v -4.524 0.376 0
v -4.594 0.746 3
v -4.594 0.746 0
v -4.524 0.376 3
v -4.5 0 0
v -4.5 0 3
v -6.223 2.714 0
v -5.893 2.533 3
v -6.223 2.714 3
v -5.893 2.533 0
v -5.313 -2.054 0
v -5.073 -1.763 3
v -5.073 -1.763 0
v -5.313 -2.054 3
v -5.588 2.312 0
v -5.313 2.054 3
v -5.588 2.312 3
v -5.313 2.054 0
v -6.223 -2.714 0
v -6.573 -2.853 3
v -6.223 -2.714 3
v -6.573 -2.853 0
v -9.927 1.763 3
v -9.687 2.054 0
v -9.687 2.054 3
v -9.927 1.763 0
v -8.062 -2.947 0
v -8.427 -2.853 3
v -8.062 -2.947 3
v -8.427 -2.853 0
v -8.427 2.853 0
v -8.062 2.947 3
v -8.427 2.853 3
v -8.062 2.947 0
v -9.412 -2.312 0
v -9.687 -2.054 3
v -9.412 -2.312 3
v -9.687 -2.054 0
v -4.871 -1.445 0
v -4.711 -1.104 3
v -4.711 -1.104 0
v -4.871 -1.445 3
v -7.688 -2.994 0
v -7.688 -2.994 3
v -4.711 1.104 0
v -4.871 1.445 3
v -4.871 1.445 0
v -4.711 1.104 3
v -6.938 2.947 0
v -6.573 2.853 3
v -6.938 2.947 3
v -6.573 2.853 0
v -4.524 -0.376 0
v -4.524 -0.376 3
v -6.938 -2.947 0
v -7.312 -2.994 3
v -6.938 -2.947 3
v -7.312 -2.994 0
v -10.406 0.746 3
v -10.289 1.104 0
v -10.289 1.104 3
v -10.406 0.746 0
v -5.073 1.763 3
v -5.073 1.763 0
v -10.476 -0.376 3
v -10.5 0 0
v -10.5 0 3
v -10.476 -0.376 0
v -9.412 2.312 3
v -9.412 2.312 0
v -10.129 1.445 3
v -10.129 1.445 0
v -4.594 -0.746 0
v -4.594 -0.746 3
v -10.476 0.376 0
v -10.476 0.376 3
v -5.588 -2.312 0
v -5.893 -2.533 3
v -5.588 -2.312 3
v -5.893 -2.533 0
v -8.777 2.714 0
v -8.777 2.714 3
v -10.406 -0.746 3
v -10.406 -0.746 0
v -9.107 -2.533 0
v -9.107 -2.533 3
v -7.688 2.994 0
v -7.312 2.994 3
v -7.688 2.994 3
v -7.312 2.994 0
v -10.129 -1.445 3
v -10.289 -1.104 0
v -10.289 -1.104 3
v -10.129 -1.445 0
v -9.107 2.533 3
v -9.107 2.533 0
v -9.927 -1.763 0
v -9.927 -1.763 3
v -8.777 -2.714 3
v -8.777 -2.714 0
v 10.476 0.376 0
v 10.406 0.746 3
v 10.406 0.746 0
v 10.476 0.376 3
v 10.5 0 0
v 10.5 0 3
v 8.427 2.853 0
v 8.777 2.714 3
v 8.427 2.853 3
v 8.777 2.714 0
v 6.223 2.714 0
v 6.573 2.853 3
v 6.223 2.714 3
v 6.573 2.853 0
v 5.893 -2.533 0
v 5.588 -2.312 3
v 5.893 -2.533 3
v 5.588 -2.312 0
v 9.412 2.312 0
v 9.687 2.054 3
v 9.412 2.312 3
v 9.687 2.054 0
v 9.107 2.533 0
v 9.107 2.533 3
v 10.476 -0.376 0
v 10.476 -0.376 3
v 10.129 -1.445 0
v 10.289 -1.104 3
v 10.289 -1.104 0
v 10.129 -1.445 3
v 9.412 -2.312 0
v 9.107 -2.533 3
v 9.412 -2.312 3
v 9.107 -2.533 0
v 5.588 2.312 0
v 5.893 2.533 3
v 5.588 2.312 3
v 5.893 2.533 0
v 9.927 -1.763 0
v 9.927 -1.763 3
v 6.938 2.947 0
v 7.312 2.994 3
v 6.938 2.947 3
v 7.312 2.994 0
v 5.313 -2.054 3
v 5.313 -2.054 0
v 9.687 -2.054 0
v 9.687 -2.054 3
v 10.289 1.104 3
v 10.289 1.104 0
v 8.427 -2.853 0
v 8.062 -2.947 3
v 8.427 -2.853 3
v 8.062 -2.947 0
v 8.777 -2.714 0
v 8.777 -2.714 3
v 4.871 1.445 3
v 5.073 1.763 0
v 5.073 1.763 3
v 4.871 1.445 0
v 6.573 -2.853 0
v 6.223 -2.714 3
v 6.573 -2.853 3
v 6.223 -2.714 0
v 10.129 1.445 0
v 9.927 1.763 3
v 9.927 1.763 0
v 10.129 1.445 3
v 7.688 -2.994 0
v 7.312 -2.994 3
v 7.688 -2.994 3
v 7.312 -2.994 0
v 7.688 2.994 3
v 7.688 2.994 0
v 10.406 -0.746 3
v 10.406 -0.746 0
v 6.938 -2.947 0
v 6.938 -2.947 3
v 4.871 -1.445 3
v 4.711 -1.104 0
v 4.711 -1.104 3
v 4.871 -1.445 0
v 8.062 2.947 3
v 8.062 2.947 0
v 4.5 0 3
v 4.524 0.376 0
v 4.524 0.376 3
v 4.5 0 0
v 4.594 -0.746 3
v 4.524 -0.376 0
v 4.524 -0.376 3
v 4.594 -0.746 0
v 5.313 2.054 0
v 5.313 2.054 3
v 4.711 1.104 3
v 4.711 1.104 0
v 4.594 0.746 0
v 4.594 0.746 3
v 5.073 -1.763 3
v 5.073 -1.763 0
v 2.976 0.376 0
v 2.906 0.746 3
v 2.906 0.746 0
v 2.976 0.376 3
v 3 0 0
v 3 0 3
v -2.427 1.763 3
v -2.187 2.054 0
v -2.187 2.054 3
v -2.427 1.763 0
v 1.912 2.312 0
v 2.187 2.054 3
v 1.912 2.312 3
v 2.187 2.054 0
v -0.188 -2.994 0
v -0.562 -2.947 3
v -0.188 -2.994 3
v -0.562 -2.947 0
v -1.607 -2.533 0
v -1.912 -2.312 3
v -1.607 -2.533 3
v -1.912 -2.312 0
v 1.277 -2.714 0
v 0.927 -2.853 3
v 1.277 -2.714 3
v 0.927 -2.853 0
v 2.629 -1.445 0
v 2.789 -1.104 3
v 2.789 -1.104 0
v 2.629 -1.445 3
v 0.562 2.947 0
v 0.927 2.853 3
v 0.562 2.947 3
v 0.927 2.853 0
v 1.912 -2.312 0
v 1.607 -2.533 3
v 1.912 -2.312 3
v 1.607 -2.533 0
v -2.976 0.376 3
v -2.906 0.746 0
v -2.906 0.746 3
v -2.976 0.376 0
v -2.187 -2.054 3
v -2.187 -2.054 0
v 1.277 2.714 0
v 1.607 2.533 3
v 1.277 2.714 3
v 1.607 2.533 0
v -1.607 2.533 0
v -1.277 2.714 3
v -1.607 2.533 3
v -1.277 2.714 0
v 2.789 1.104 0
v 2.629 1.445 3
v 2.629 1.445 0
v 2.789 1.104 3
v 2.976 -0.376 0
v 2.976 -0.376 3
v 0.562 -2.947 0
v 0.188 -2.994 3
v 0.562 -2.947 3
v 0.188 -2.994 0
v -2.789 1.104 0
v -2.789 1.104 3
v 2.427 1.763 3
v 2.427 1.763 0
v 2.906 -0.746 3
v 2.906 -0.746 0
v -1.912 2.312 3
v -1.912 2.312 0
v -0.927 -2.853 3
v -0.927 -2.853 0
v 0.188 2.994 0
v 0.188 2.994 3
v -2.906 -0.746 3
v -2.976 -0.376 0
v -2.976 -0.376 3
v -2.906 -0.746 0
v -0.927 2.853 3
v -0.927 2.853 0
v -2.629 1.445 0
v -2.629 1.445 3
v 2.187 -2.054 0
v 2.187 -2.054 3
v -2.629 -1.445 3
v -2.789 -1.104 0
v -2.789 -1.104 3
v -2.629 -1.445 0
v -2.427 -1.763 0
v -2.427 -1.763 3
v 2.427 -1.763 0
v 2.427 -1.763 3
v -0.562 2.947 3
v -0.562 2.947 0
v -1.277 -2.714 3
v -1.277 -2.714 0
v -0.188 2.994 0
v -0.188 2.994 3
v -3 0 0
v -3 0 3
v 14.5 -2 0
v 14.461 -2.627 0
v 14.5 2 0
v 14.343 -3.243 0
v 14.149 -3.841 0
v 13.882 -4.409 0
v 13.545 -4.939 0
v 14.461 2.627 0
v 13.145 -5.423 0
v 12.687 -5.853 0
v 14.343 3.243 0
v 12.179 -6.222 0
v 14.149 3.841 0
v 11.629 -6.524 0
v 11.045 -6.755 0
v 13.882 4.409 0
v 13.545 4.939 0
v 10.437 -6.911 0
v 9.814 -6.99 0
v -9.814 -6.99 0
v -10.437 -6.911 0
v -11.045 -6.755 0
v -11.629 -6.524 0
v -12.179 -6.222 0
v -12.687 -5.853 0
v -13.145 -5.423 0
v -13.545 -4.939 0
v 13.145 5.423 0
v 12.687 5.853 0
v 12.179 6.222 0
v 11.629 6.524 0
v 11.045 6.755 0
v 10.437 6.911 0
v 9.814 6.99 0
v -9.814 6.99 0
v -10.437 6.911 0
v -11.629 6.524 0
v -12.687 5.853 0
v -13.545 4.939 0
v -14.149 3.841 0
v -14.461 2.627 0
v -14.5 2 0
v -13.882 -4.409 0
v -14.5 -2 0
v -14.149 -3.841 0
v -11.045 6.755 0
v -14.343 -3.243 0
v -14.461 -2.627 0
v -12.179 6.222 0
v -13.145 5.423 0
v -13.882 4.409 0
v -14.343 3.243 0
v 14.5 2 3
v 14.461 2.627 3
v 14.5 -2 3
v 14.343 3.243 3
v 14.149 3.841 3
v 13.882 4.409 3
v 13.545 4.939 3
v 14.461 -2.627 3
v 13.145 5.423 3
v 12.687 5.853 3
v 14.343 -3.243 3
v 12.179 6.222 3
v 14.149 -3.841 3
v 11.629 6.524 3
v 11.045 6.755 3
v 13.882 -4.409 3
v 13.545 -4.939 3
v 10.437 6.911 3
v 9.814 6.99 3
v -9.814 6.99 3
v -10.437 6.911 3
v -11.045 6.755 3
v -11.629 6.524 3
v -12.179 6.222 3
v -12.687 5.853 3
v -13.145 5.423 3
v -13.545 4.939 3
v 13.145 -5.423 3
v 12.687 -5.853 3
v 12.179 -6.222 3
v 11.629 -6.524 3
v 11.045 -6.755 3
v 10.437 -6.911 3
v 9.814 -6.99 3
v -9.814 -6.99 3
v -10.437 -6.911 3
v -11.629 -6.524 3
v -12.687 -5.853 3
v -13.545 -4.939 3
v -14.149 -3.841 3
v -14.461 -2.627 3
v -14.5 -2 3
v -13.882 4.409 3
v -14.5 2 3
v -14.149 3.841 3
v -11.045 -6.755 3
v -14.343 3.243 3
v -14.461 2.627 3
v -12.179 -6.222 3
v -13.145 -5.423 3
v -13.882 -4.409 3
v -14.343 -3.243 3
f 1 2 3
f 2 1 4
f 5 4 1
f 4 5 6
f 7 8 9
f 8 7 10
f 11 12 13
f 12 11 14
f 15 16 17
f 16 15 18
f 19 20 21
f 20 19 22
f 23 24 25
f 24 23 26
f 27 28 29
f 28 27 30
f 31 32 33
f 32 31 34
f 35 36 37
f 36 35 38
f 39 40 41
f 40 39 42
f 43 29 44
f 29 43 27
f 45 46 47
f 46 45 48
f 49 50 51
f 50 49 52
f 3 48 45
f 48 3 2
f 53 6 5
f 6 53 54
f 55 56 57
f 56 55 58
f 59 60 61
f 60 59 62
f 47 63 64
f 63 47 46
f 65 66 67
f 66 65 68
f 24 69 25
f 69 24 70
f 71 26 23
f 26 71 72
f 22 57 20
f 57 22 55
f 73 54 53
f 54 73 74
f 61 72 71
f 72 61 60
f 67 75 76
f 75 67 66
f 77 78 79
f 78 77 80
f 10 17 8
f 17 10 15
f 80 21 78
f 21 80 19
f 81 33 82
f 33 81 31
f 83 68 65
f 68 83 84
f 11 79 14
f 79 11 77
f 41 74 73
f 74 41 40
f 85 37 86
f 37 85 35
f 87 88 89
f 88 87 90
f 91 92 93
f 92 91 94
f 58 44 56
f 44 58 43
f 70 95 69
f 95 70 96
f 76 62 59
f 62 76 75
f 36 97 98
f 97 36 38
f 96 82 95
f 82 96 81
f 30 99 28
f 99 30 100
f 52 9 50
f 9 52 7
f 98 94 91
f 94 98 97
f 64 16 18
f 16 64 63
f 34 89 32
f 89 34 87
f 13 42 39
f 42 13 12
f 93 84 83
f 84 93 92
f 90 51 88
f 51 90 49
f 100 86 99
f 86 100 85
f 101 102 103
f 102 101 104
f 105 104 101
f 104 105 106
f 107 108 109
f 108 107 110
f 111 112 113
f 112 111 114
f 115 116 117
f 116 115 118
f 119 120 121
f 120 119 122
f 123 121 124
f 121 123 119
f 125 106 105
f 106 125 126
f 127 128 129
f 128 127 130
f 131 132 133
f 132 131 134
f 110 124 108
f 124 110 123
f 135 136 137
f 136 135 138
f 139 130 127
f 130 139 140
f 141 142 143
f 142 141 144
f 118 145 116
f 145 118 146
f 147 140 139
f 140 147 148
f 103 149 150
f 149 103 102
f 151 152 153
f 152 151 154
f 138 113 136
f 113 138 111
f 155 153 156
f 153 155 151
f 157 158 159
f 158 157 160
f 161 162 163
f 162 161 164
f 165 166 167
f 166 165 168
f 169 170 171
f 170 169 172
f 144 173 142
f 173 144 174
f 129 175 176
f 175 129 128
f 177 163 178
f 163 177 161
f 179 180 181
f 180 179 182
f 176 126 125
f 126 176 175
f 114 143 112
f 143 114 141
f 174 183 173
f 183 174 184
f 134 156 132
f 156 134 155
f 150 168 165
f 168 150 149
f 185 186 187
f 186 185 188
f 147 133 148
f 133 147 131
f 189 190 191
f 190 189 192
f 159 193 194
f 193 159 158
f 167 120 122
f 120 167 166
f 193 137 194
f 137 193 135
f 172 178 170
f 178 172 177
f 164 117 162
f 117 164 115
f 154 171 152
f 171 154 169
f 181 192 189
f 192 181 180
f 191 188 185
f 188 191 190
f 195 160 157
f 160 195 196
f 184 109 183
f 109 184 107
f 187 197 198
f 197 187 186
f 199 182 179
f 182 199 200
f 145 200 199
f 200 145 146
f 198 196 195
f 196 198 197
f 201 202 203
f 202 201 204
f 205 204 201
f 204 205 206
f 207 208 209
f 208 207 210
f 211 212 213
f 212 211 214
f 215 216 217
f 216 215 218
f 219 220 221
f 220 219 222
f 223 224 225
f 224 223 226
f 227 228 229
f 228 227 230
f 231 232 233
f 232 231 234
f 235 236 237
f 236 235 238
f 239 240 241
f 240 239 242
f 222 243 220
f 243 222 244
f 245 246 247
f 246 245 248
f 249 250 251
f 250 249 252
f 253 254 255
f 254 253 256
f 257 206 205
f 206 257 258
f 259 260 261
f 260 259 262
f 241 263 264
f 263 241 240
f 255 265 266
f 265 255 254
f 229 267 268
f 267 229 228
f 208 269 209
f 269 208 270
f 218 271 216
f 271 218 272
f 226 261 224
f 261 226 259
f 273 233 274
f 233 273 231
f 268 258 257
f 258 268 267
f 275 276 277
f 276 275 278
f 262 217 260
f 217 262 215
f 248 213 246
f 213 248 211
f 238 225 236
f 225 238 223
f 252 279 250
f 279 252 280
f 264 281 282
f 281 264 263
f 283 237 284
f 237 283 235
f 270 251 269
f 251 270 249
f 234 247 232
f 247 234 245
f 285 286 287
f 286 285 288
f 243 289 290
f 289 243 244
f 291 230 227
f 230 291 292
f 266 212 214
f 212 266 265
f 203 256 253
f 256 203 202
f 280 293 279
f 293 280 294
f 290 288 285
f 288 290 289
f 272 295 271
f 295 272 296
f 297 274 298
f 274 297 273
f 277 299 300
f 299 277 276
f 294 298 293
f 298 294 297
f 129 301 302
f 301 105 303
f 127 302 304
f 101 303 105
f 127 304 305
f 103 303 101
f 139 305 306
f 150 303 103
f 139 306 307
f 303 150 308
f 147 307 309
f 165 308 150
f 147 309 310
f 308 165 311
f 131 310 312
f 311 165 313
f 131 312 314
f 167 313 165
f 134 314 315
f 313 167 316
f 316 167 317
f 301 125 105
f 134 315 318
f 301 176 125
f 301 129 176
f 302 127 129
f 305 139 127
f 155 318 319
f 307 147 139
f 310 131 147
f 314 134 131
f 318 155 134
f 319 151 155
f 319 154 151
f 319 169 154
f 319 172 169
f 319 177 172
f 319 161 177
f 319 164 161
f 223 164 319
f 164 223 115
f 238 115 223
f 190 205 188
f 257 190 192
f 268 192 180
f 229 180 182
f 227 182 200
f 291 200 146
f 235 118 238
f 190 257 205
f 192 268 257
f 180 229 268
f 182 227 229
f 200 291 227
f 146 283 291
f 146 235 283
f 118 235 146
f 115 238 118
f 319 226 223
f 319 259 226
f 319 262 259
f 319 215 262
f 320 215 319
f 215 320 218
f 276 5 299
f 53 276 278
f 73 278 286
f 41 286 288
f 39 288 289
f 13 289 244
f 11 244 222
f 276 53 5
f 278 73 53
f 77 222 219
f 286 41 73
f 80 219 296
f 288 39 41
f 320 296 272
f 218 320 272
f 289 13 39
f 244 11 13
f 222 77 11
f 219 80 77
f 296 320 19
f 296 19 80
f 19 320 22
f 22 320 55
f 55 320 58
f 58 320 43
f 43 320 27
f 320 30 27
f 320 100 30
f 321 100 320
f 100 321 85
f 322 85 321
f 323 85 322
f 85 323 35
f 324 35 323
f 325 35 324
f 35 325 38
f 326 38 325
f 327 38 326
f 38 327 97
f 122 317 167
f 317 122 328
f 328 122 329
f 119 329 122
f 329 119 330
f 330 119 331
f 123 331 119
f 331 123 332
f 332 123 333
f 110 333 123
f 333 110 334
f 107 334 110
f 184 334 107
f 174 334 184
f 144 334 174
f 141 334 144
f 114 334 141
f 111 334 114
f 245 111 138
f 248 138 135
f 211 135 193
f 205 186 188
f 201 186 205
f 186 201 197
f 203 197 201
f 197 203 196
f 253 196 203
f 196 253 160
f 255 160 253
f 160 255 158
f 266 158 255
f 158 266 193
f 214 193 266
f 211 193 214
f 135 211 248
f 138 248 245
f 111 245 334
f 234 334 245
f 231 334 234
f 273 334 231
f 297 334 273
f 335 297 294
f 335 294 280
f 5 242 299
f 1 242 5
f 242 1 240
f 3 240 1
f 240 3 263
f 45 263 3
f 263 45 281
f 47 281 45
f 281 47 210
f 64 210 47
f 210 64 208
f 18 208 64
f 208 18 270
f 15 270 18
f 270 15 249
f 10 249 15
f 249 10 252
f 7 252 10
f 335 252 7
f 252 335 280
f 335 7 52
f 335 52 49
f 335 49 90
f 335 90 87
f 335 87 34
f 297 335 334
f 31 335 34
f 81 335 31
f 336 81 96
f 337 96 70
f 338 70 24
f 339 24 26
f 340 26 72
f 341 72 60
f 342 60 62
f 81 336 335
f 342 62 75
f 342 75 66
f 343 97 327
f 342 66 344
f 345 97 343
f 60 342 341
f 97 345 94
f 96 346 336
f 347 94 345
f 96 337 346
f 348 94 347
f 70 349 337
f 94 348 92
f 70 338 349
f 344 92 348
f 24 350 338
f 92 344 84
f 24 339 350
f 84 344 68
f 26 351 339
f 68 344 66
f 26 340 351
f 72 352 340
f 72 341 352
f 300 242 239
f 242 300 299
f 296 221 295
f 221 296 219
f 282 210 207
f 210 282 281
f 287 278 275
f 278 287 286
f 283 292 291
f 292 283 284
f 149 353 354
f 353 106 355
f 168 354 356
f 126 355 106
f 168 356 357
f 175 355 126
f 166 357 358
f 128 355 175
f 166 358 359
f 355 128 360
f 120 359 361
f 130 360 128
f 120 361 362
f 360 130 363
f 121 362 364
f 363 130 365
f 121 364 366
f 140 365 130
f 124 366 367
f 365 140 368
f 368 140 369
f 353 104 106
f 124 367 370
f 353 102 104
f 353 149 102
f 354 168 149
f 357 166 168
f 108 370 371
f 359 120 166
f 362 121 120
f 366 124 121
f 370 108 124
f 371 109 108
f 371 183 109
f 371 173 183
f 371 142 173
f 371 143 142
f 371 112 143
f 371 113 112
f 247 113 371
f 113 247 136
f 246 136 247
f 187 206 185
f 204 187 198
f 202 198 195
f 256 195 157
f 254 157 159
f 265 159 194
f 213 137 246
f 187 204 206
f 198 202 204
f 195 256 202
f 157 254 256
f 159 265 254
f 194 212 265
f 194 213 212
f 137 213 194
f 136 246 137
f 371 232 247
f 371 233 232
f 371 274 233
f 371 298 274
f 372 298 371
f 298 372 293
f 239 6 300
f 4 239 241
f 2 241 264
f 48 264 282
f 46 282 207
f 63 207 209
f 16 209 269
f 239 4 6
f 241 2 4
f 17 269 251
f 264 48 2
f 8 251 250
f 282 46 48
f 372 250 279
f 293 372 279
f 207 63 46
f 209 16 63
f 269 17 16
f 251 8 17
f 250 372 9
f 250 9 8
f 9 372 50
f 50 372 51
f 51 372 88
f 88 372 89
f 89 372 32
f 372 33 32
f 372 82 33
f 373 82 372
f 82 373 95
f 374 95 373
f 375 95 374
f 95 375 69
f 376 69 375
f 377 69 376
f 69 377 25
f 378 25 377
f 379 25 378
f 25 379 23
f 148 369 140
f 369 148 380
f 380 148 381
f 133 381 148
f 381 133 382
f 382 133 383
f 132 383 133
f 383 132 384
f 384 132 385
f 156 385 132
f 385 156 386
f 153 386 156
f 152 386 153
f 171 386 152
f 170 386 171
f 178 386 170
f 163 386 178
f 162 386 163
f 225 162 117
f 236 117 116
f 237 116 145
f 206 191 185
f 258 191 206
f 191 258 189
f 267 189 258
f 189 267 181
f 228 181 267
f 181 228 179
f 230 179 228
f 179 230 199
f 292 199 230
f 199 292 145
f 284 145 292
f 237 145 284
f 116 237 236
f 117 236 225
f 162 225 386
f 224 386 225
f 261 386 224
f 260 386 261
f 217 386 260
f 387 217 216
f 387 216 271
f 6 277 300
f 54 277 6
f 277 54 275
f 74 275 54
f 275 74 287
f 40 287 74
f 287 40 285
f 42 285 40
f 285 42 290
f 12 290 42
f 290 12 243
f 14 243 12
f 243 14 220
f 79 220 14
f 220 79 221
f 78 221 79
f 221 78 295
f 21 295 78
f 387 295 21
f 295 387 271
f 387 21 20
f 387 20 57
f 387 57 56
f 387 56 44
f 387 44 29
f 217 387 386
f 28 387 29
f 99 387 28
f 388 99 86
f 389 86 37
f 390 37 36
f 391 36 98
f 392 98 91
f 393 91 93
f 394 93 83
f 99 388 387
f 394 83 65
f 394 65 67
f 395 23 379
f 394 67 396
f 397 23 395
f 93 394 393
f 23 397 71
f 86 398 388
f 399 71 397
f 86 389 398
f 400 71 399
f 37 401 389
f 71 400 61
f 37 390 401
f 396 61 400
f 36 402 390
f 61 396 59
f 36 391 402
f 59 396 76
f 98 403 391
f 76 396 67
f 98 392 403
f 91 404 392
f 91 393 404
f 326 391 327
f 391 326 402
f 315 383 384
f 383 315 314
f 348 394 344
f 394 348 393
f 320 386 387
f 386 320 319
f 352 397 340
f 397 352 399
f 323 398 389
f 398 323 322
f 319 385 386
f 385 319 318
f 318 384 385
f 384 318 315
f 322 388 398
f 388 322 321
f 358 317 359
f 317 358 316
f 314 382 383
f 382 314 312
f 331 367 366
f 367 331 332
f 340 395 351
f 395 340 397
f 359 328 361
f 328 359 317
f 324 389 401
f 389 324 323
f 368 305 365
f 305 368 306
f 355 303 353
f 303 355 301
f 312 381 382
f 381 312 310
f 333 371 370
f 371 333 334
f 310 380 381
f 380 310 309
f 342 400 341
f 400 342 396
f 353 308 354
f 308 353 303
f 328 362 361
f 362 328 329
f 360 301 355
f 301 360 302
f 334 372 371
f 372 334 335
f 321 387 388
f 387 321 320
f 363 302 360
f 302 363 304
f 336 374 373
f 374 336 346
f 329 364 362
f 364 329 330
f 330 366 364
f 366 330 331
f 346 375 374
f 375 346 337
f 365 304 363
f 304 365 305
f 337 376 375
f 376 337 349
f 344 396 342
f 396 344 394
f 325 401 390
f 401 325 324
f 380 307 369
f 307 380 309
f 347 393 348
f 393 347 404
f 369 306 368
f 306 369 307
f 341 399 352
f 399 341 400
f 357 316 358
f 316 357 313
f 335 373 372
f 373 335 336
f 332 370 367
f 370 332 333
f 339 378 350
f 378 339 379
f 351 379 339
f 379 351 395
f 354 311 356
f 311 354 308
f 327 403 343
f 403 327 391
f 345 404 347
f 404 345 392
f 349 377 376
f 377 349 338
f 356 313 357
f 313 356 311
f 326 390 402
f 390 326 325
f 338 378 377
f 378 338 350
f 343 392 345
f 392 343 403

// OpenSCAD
$fn = 50;


difference() {
	union() {
		hull() {
			translate(v = [-9.5000000000, 2.0000000000, 0]) {
				cylinder(h = 3, r = 5);
			}
			translate(v = [9.5000000000, 2.0000000000, 0]) {
				cylinder(h = 3, r = 5);
			}
			translate(v = [-9.5000000000, -2.0000000000, 0]) {
				cylinder(h = 3, r = 5);
			}
			translate(v = [9.5000000000, -2.0000000000, 0]) {
				cylinder(h = 3, r = 5);
			}
		}
	}
	union() {
		#translate(v = [-7.5000000000, 0.0000000000, 0]) {
			cylinder(h = 3, r = 3.0000000000);
		}
		#translate(v = [7.5000000000, 0.0000000000, 0]) {
			cylinder(h = 3, r = 3.0000000000);
		}
		#translate(v = [-7.5000000000, 0.0000000000, -100.0000000000]) {
			cylinder(h = 200, r = 3.0000000000);
		}
		#translate(v = [-7.5000000000, 0.0000000000, -100.0000000000]) {
			cylinder(h = 200, r = 3.0000000000);
		}
		#translate(v = [7.5000000000, 0.0000000000, -100.0000000000]) {
			cylinder(h = 200, r = 3.0000000000);
		}
		#translate(v = [7.5000000000, 0.0000000000, -100.0000000000]) {
			cylinder(h = 200, r = 3.0000000000);
		}
		#translate(v = [-7.5000000000, 0.0000000000, 0]) {
			cylinder(h = 3, r = 1.5000000000);
		}
		#translate(v = [7.5000000000, 0.0000000000, 0]) {
			cylinder(h = 3, r = 1.5000000000);
		}
		#translate(v = [-7.5000000000, 0.0000000000, 0]) {
			cylinder(h = 3, r = 1.5000000000);
		}
		#translate(v = [7.5000000000, 0.0000000000, 0]) {
			cylinder(h = 3, r = 1.5000000000);
		}
		#translate(v = [-7.5000000000, 0.0000000000, 0]) {
			cylinder(h = 3, r = 1.5000000000);
		}
		#translate(v = [7.5000000000, 0.0000000000, 0]) {
			cylinder(h = 3, r = 1.5000000000);
		}
		#cylinder(h = 3, r = 3.0000000000);
	}
}
